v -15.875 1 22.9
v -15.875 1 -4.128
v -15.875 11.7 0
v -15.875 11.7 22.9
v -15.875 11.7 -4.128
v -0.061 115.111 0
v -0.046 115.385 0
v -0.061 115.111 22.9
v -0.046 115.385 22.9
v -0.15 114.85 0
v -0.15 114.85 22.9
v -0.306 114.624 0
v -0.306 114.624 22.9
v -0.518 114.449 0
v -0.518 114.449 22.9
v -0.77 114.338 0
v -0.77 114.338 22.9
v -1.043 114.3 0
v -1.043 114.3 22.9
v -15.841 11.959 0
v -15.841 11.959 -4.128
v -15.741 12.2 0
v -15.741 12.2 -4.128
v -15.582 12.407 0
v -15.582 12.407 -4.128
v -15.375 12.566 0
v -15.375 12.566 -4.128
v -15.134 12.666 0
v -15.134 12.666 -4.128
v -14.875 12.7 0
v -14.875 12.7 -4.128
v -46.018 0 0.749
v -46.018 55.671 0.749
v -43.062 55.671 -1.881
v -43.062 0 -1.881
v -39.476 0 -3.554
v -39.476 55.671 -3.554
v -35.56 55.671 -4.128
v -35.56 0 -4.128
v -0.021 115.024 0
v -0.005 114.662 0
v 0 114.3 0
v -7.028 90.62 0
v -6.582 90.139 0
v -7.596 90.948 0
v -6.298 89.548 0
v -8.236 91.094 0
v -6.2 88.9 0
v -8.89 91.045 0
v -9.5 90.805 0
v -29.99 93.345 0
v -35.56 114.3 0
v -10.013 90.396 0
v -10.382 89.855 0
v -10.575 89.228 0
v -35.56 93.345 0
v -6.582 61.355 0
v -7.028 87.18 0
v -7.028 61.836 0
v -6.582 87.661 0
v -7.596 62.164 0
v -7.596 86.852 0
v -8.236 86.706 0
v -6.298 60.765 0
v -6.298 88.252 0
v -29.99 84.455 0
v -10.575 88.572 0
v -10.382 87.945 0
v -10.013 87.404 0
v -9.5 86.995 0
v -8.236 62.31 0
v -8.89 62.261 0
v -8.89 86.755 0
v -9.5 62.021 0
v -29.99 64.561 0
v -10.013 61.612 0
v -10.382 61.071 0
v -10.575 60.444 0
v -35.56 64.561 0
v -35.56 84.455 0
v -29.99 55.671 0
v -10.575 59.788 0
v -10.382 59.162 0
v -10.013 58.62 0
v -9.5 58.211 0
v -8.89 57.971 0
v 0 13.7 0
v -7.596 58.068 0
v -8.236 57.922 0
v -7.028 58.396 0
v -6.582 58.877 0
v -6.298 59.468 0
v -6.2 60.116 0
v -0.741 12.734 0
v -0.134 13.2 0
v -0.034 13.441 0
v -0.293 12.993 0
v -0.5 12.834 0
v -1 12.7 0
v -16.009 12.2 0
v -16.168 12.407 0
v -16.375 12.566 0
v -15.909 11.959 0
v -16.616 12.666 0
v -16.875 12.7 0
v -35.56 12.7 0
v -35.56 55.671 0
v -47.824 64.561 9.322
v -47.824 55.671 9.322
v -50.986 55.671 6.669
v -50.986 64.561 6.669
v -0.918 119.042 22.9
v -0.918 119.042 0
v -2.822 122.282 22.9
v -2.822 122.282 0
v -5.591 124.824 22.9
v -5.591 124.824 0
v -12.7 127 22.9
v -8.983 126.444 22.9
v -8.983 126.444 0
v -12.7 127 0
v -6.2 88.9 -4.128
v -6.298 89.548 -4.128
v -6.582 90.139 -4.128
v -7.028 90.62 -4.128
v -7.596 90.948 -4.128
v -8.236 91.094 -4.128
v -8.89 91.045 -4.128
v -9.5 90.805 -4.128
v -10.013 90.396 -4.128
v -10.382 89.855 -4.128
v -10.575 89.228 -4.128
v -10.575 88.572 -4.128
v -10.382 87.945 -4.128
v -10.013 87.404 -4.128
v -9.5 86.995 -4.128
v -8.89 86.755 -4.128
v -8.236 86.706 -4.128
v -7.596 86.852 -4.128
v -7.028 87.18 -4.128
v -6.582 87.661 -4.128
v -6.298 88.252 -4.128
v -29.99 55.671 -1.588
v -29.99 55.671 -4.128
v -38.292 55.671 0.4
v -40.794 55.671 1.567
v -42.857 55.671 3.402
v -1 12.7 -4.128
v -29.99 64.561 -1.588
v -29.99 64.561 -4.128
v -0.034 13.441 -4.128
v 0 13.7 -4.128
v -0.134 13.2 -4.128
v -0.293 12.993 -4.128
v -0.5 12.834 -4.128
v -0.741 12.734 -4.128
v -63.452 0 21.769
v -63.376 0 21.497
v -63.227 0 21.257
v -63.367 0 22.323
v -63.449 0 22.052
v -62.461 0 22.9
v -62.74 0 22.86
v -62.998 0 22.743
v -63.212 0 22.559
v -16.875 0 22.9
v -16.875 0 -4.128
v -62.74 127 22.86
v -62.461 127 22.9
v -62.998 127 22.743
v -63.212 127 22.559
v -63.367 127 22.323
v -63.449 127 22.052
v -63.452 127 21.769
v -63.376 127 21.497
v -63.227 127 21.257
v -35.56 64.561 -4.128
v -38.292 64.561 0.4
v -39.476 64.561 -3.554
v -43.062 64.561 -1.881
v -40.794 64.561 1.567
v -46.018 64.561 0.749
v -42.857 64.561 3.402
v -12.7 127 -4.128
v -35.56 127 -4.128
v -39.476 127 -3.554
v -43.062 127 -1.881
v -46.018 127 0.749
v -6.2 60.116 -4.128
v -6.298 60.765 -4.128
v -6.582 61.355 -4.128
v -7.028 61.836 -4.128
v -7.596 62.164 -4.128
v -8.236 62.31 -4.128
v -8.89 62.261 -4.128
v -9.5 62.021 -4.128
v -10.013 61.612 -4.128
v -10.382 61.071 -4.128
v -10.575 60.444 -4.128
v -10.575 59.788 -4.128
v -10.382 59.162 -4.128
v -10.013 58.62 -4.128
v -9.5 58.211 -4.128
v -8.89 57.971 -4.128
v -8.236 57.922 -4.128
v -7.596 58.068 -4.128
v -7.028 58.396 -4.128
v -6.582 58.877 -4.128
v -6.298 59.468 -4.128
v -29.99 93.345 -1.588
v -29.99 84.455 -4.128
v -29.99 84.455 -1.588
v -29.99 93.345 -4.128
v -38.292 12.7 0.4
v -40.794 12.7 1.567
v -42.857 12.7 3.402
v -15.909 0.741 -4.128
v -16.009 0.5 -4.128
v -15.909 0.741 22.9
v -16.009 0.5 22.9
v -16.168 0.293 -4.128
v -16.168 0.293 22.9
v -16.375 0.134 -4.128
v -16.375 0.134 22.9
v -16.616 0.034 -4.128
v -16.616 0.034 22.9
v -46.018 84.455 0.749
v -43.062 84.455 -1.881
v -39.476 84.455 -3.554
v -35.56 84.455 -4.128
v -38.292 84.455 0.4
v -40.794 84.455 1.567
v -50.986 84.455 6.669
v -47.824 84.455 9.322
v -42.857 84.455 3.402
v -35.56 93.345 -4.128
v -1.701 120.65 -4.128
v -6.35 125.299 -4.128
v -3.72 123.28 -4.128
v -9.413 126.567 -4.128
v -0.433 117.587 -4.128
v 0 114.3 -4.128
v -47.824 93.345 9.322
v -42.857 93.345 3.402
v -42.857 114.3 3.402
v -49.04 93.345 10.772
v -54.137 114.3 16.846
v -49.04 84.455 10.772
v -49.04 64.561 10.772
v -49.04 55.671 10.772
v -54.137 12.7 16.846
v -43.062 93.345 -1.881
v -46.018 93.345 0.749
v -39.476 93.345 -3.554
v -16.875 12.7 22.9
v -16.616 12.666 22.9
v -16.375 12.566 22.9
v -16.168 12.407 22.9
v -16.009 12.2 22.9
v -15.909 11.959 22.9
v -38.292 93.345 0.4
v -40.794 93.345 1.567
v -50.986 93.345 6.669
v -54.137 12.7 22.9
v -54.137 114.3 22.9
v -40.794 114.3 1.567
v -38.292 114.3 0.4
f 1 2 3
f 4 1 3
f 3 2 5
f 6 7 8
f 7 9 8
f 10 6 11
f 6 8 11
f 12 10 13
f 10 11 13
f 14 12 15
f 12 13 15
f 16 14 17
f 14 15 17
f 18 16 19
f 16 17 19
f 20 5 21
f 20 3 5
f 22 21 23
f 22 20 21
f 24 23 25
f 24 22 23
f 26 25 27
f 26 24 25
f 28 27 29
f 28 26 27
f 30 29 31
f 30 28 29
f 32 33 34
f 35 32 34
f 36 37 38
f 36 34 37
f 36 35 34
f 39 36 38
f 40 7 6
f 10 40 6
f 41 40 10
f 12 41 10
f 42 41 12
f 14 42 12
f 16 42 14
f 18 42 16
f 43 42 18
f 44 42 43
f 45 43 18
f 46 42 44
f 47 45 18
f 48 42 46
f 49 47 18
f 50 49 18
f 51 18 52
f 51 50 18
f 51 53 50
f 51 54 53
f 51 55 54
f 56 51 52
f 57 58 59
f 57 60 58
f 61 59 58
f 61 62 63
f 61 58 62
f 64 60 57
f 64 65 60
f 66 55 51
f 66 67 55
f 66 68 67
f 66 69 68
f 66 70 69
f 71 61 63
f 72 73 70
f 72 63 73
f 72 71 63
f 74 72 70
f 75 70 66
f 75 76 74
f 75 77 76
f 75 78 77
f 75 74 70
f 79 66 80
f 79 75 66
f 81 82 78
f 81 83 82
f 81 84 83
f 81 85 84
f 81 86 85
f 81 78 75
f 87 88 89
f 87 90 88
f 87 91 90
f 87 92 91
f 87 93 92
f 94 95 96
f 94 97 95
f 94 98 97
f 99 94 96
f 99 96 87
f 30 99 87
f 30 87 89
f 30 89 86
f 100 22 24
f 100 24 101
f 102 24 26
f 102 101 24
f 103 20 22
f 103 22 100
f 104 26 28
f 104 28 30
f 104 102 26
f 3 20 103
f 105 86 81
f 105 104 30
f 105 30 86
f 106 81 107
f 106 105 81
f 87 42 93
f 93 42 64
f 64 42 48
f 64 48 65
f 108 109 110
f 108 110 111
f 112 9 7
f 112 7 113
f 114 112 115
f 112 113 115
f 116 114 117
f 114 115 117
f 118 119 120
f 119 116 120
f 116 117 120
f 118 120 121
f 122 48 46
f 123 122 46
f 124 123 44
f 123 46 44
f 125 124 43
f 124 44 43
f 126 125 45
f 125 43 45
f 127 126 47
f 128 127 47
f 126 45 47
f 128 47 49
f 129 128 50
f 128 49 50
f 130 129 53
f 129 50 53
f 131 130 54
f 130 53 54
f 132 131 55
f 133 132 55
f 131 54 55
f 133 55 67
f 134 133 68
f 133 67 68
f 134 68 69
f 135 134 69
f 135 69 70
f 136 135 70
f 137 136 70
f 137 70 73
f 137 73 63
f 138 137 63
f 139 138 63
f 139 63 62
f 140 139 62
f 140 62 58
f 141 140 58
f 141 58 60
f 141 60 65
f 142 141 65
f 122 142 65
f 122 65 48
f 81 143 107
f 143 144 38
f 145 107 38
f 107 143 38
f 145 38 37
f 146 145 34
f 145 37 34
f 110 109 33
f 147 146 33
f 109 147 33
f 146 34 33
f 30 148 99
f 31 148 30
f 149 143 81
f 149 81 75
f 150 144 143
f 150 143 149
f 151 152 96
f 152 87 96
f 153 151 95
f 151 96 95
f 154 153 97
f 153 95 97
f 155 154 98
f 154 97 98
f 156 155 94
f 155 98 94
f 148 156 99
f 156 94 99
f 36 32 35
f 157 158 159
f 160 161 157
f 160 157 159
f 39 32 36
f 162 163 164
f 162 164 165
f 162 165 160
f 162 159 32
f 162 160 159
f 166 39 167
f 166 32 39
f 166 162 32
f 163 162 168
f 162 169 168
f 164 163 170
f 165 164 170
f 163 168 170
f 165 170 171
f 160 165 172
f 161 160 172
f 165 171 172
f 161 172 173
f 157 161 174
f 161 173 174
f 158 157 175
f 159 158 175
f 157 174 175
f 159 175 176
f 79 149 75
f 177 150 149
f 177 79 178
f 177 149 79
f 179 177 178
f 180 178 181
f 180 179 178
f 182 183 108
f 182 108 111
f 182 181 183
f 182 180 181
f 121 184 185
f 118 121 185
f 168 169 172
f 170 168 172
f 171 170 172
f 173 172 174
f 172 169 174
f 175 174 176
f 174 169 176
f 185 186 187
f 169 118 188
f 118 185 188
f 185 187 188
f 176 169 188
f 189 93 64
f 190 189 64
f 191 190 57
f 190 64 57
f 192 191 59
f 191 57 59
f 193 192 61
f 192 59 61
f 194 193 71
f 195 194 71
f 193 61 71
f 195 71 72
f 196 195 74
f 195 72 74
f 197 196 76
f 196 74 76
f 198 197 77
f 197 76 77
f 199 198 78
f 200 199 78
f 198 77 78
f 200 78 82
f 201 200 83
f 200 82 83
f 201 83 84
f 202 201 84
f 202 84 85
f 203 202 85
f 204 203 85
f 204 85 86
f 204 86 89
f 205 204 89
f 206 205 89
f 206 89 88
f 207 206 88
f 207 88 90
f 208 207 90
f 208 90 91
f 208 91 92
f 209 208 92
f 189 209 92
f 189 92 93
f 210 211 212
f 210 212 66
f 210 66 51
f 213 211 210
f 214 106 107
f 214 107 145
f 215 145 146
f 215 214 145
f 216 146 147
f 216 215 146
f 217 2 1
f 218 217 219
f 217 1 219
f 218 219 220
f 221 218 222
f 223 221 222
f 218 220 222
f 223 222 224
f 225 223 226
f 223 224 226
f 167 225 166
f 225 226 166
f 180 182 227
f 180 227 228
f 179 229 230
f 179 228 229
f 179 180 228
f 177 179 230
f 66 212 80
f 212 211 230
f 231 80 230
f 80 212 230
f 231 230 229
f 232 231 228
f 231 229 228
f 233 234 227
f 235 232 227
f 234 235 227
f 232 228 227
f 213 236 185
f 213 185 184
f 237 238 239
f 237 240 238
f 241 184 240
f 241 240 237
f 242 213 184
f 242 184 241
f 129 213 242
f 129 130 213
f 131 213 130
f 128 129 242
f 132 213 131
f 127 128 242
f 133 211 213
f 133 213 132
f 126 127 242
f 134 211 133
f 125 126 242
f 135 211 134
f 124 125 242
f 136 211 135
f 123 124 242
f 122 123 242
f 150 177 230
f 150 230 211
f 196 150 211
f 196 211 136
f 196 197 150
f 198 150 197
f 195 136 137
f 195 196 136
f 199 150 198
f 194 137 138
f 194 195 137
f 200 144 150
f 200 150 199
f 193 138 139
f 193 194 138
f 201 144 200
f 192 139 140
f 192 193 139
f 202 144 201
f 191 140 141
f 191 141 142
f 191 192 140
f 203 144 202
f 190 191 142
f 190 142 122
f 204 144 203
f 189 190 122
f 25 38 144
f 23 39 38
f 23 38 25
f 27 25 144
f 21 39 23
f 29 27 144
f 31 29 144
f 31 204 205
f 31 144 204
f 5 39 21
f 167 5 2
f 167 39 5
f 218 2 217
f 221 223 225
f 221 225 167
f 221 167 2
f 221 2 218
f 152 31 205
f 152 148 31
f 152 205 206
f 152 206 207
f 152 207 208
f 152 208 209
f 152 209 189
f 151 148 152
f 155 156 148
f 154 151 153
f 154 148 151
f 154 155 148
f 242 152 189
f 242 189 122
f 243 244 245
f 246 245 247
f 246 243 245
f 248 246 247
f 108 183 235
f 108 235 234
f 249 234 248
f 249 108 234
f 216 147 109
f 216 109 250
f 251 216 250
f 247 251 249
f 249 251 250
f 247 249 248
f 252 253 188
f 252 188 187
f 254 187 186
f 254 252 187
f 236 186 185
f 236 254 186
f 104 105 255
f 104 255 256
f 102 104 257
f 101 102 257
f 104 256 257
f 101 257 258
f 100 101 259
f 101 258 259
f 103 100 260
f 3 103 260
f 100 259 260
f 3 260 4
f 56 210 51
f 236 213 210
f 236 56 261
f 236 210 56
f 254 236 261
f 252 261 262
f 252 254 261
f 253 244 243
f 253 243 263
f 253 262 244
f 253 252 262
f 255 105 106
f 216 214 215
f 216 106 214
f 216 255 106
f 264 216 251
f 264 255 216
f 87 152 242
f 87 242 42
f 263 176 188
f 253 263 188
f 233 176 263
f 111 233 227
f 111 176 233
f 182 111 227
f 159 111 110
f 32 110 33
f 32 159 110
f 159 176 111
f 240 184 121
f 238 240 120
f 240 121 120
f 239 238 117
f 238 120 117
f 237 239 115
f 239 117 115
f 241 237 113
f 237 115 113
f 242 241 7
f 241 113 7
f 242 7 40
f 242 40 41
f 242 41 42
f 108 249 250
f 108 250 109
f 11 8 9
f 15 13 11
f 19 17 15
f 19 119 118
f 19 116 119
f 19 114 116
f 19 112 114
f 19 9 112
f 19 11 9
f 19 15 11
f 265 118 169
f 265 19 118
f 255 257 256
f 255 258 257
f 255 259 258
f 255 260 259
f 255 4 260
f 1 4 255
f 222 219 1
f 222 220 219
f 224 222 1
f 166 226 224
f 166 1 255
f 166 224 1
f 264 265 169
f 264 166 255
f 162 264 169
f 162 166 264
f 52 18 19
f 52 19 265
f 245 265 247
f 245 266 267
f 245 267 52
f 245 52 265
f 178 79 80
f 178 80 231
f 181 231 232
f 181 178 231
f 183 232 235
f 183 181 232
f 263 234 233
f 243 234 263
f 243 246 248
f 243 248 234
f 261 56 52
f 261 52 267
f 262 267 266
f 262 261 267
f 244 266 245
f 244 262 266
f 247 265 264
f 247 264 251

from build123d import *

# Parameters (mm, degrees)
BOSS_EXTRUDE1_DEPTH     = 127
SKETCH2_R               = 2.049999964
SKETCH2_W               = 19.05
SKETCH2_H               = 8.89
CUT_EXTRUDE1_DEPTH      = 25.48749992
FILLET1_R               = 12.7
BOSS_EXTRUDE2_REACH     = 18.672
SKETCH4_W               = 1.891908828
SKETCH4_H               = 8.89
BOSS_EXTRUDE3_DEPTH     = 12.7
SKETCH6_W               = 15.875
SKETCH6_H               = 12.7
CUT_EXTRUDE2_DEPTH      = 25.48749992
BOSS_EXTRUDE4_DEPTH     = 127
SKETCH8_R               = 2.200000045
SKETCH8_W               = 17.833904447
SKETCH8_H               = 8.89
SKETCH8_W_2             = 15.875
SKETCH8_H_2             = 12.7
CUT_EXTRUDE3_DEPTH      = 23.89999992
CUT_EXTRUDE3_DEPTH_BACK = 5.1275
SKETCH9_W               = 4.918962954
SKETCH9_H               = 8.89
CUT_EXTRUDE4_DEPTH      = 22.500442069
FILLET2_R               = 1
FILLET3_R               = 1
BOSS_EXTRUDE5_DEPTH     = 114.3
BOSS_EXTRUDE6_DEPTH     = 12.7
CUT_EXTRUDE5_DEPTH      = 23.89999992
FILLET4_R               = 1


with BuildPart() as part:
    # Sketch1 → Boss-Extrude1 (new body)
    with BuildSketch(Plane(origin=(0, 0, 0), x_dir=(1, 0, 0), z_dir=(0, 1, 0))):
        with BuildLine():
            Line((0, 0), (-35.56, 0))
            ThreePointArc((-35.56, 0), (-39.585438943, -0.892418328), (-42.856573321, -3.402448018))
            Line((-42.856573321, -3.402448018), (-59.216961931, -22.89999992))
            Line((-59.216961931, -22.89999992), (-60.433057484, -21.87957459))
            Line((-60.433057484, -21.87957459), (-44.072668874, -2.382022687))
            ThreePointArc((-44.072668874, -2.382022687), (-40.256345434, 0.546345283), (-35.56, 1.5875))
            Line((-35.56, 1.5875), (0, 1.5875))
            Line((0, 1.5875), (0, 0))
        make_face()
    extrude(amount=BOSS_EXTRUDE1_DEPTH)

    # Sketch2 → Cut-Extrude1 (cut, through all)
    with BuildSketch(Plane(origin=(0, 0, -1.5875), x_dir=(-1, 0, 0), z_dir=(0, 0, -1))):
        with Locations((8.399999964, 88.9)):
            Circle(SKETCH2_R)
        with Locations((8.399999964, 60.116067728)):
            Circle(SKETCH2_R)
        with Locations((39.514999964, 88.9)):
            Rectangle(SKETCH2_W, SKETCH2_H)
        with Locations((39.514999964, 60.116067728)):
            Rectangle(SKETCH2_W, SKETCH2_H)
    extrude(amount=-CUT_EXTRUDE1_DEPTH, mode=Mode.SUBTRACT)

    # Fillet1
    fillet1_edges = [part.edges().sort_by_distance(p)[0] for p in [
        (0, 0, -0.79375),
        (-59.825009707, 127, 22.389787255),
        (0, 127, -0.79375),
        (-59.825009707, 0, 22.389787255),
    ]]
    fillet(fillet1_edges, radius=FILLET1_R)

    # Boss-Extrude2: up to this face of the body (flat: up to its plane)
    boss_extrude2_end = Plane(part.part.faces().sort_by_distance((-49.039999964, 88.9, 9.536713147))[0])
    # Sketch4 → Boss-Extrude2 (add, up to the picked face)
    with BuildSketch(Plane(origin=(-23.473890996, 0, -19.696933277), x_dir=(0.64278761, 0, -0.766044443), z_dir=(0.766044443, 0, 0.64278761)), mode=Mode.PRIVATE) as boss_extrude2_sk1:
        with Locations((-38.827850468, 88.9)):
            Rectangle(SKETCH4_W, SKETCH4_H)
    boss_extrude2_tool1 = split(extrude(boss_extrude2_sk1.sketch, amount=-BOSS_EXTRUDE2_REACH, mode=Mode.PRIVATE), bisect_by=boss_extrude2_end, keep=Keep.BOTH, mode=Mode.PRIVATE)
    add(boss_extrude2_tool1.solids().sort_by_distance((-48.431952, 88.9, 10.046926))[0])
    # Sketch4 → Boss-Extrude2 (add, up to the picked face)
    with BuildSketch(Plane(origin=(-23.473890996, 0, -19.696933277), x_dir=(0.64278761, 0, -0.766044443), z_dir=(0.766044443, 0, 0.64278761)), mode=Mode.PRIVATE) as boss_extrude2_sk2:
        with Locations((-38.827850468, 60.116067728)):
            Rectangle(SKETCH4_W, SKETCH4_H)
    boss_extrude2_tool2 = split(extrude(boss_extrude2_sk2.sketch, amount=-BOSS_EXTRUDE2_REACH, mode=Mode.PRIVATE), bisect_by=boss_extrude2_end, keep=Keep.BOTH, mode=Mode.PRIVATE)
    add(boss_extrude2_tool2.solids().sort_by_distance((-48.431952, 60.116068, 10.046926))[0])

    # Sketch5 → Boss-Extrude3 (add)
    with BuildSketch(Plane.XZ):
        with BuildLine():
            Line((-44.072668874, 2.382022687), (-60.433057484, 21.87957459))
            Line((-60.433057484, 21.87957459), (-59.216961931, 22.89999992))
            Line((-59.216961931, 22.89999992), (0, 22.89999992))
            Line((0, 22.89999992), (0, -1.5875))
            Line((0, -1.5875), (-35.56, -1.5875))
            ThreePointArc((-35.56, -1.5875), (-40.256345434, -0.546345283), (-44.072668874, 2.382022687))
        make_face()
    extrude(amount=-BOSS_EXTRUDE3_DEPTH)

    # Sketch6 → Cut-Extrude2 (cut, through all)
    with BuildSketch(Plane(origin=(0, 0, -1.5875), x_dir=(-1, 0, 0), z_dir=(0, 0, -1))):
        with Locations((7.9375, 6.35)):
            Rectangle(SKETCH6_W, SKETCH6_H)
    extrude(amount=-CUT_EXTRUDE2_DEPTH, mode=Mode.SUBTRACT)

    # Sketch7 → Boss-Extrude4 (add)
    with BuildSketch(Plane.XZ):
        with BuildLine():
            Line((-59.216961931, 22.89999992), (-64.605030517, 22.89999992))
            Line((-64.605030517, 22.89999992), (-46.01842176, 0.749342159))
            ThreePointArc((-46.01842176, 0.749342159), (-41.329795818, -2.848367063), (-35.56, -4.1275))
            Line((-35.56, -4.1275), (0, -4.1275))
            Line((0, -4.1275), (0, -1.5875))
            Line((0, -1.5875), (-15.875, -1.5875))
            Line((-15.875, -1.5875), (-35.56, -1.5875))
            ThreePointArc((-35.56, -1.5875), (-40.256345434, -0.546345283), (-44.072668874, 2.382022687))
            Line((-44.072668874, 2.382022687), (-52.269654841, 12.150810162))
            Line((-52.269654841, 12.150810162), (-51.053559288, 13.171235492))
            Line((-51.053559288, 13.171235492), (-59.216961931, 22.89999992))
        make_face()
    extrude(amount=-BOSS_EXTRUDE4_DEPTH)

    # Sketch8 → Cut-Extrude3 (cut, two sides)
    with BuildSketch(Plane.XY) as cut_extrude3_sk:
        with Locations((-8.399999964, 88.9)):
            Circle(SKETCH8_R)
        with Locations((-8.399999964, 60.116067728)):
            Circle(SKETCH8_R)
        with BuildLine():
            Line((-12.7, 127), (0, 127))
            Line((0, 127), (0, 114.3))
            ThreePointArc((0, 114.3), (-3.719743879, 123.280256121), (-12.7, 127))
        make_face()
        with Locations((-38.906952188, 88.9)):
            Rectangle(SKETCH8_W, SKETCH8_H)
        with Locations((-38.906952188, 60.116067728)):
            Rectangle(SKETCH8_W, SKETCH8_H)
        with Locations((-7.9375, 6.35)):
            Rectangle(SKETCH8_W_2, SKETCH8_H_2)
    extrude(amount=CUT_EXTRUDE3_DEPTH, mode=Mode.SUBTRACT)
    extrude(cut_extrude3_sk.sketch, amount=-CUT_EXTRUDE3_DEPTH_BACK, mode=Mode.SUBTRACT)

    # Sketch9 → Cut-Extrude4 (cut, through all)
    with BuildSketch(Plane(origin=(-23.473890996, 0, -19.696933277), x_dir=(0.64278761, 0, -0.766044443), z_dir=(0.766044443, 0, 0.64278761))):
        with Locations((-35.422414577, 88.9)):
            Rectangle(SKETCH9_W, SKETCH9_H)
        with Locations((-35.422414577, 60.116067728)):
            Rectangle(SKETCH9_W, SKETCH9_H)
    extrude(amount=-CUT_EXTRUDE4_DEPTH, mode=Mode.SUBTRACT)

    # Fillet2
    fillet2_edges = [part.edges().sort_by_distance(p)[0] for p in [
        (0, 12.7, -2.06375),
        (-15.875, 12.7, 11.44999996),
        (-15.875, 0, 9.38624996),
        (-64.605030517, 63.5, 22.89999992),
    ]]
    fillet(fillet2_edges, radius=FILLET2_R)

    # Fillet3
    fillet3_edges = [part.edges().sort_by_distance(p)[0] for p in [
        (-15.875, 12.7, -2.06375),
    ]]
    fillet(fillet3_edges, radius=FILLET3_R)

    # Sketch10 → Boss-Extrude5 (add)
    with BuildSketch(Plane(origin=(0, 12.7, 0), x_dir=(1, 0, 0), z_dir=(0, 1, 0))):
        Polygon((-59.216961931, -22.89999992), (-54.136961931, -22.89999992), (-54.136961931, -16.84589167), align=None)
    extrude(amount=BOSS_EXTRUDE5_DEPTH)

    # Sketch11 → Boss-Extrude6 (add)
    with BuildSketch(Plane(origin=(0, 114.3, 0), x_dir=(1, 0, 0), z_dir=(0, 1, 0))):
        with BuildLine():
            Line((-54.136961931, -22.89999992), (-54.136961931, -16.84589167))
            Line((-54.136961931, -16.84589167), (-42.856573321, -3.402448018))
            ThreePointArc((-42.856573321, -3.402448018), (-39.585438943, -0.892418328), (-35.56, 0))
            Line((-35.56, 0), (0, 0))
            Line((0, 0), (0, -22.89999992))
            Line((0, -22.89999992), (-54.136961931, -22.89999992))
        make_face()
    extrude(amount=BOSS_EXTRUDE6_DEPTH)

    # Sketch12 → Cut-Extrude5 (cut, through all)
    with BuildSketch(Plane(origin=(0, 0, 0), x_dir=(-1, 0, 0), z_dir=(0, 0, -1))):
        with BuildLine():
            Line((12.7, 127), (0, 127))
            Line((0, 127), (0, 114.3))
            ThreePointArc((0, 114.3), (3.719743879, 123.280256121), (12.7, 127))
        make_face()
    extrude(amount=-CUT_EXTRUDE5_DEPTH, mode=Mode.SUBTRACT)

    # Fillet4
    fillet4_edges = [part.edges().sort_by_distance(p)[0] for p in [
        (0, 114.3, 11.44999996),
    ]]
    fillet(fillet4_edges, radius=FILLET4_R)


solid = part.part
